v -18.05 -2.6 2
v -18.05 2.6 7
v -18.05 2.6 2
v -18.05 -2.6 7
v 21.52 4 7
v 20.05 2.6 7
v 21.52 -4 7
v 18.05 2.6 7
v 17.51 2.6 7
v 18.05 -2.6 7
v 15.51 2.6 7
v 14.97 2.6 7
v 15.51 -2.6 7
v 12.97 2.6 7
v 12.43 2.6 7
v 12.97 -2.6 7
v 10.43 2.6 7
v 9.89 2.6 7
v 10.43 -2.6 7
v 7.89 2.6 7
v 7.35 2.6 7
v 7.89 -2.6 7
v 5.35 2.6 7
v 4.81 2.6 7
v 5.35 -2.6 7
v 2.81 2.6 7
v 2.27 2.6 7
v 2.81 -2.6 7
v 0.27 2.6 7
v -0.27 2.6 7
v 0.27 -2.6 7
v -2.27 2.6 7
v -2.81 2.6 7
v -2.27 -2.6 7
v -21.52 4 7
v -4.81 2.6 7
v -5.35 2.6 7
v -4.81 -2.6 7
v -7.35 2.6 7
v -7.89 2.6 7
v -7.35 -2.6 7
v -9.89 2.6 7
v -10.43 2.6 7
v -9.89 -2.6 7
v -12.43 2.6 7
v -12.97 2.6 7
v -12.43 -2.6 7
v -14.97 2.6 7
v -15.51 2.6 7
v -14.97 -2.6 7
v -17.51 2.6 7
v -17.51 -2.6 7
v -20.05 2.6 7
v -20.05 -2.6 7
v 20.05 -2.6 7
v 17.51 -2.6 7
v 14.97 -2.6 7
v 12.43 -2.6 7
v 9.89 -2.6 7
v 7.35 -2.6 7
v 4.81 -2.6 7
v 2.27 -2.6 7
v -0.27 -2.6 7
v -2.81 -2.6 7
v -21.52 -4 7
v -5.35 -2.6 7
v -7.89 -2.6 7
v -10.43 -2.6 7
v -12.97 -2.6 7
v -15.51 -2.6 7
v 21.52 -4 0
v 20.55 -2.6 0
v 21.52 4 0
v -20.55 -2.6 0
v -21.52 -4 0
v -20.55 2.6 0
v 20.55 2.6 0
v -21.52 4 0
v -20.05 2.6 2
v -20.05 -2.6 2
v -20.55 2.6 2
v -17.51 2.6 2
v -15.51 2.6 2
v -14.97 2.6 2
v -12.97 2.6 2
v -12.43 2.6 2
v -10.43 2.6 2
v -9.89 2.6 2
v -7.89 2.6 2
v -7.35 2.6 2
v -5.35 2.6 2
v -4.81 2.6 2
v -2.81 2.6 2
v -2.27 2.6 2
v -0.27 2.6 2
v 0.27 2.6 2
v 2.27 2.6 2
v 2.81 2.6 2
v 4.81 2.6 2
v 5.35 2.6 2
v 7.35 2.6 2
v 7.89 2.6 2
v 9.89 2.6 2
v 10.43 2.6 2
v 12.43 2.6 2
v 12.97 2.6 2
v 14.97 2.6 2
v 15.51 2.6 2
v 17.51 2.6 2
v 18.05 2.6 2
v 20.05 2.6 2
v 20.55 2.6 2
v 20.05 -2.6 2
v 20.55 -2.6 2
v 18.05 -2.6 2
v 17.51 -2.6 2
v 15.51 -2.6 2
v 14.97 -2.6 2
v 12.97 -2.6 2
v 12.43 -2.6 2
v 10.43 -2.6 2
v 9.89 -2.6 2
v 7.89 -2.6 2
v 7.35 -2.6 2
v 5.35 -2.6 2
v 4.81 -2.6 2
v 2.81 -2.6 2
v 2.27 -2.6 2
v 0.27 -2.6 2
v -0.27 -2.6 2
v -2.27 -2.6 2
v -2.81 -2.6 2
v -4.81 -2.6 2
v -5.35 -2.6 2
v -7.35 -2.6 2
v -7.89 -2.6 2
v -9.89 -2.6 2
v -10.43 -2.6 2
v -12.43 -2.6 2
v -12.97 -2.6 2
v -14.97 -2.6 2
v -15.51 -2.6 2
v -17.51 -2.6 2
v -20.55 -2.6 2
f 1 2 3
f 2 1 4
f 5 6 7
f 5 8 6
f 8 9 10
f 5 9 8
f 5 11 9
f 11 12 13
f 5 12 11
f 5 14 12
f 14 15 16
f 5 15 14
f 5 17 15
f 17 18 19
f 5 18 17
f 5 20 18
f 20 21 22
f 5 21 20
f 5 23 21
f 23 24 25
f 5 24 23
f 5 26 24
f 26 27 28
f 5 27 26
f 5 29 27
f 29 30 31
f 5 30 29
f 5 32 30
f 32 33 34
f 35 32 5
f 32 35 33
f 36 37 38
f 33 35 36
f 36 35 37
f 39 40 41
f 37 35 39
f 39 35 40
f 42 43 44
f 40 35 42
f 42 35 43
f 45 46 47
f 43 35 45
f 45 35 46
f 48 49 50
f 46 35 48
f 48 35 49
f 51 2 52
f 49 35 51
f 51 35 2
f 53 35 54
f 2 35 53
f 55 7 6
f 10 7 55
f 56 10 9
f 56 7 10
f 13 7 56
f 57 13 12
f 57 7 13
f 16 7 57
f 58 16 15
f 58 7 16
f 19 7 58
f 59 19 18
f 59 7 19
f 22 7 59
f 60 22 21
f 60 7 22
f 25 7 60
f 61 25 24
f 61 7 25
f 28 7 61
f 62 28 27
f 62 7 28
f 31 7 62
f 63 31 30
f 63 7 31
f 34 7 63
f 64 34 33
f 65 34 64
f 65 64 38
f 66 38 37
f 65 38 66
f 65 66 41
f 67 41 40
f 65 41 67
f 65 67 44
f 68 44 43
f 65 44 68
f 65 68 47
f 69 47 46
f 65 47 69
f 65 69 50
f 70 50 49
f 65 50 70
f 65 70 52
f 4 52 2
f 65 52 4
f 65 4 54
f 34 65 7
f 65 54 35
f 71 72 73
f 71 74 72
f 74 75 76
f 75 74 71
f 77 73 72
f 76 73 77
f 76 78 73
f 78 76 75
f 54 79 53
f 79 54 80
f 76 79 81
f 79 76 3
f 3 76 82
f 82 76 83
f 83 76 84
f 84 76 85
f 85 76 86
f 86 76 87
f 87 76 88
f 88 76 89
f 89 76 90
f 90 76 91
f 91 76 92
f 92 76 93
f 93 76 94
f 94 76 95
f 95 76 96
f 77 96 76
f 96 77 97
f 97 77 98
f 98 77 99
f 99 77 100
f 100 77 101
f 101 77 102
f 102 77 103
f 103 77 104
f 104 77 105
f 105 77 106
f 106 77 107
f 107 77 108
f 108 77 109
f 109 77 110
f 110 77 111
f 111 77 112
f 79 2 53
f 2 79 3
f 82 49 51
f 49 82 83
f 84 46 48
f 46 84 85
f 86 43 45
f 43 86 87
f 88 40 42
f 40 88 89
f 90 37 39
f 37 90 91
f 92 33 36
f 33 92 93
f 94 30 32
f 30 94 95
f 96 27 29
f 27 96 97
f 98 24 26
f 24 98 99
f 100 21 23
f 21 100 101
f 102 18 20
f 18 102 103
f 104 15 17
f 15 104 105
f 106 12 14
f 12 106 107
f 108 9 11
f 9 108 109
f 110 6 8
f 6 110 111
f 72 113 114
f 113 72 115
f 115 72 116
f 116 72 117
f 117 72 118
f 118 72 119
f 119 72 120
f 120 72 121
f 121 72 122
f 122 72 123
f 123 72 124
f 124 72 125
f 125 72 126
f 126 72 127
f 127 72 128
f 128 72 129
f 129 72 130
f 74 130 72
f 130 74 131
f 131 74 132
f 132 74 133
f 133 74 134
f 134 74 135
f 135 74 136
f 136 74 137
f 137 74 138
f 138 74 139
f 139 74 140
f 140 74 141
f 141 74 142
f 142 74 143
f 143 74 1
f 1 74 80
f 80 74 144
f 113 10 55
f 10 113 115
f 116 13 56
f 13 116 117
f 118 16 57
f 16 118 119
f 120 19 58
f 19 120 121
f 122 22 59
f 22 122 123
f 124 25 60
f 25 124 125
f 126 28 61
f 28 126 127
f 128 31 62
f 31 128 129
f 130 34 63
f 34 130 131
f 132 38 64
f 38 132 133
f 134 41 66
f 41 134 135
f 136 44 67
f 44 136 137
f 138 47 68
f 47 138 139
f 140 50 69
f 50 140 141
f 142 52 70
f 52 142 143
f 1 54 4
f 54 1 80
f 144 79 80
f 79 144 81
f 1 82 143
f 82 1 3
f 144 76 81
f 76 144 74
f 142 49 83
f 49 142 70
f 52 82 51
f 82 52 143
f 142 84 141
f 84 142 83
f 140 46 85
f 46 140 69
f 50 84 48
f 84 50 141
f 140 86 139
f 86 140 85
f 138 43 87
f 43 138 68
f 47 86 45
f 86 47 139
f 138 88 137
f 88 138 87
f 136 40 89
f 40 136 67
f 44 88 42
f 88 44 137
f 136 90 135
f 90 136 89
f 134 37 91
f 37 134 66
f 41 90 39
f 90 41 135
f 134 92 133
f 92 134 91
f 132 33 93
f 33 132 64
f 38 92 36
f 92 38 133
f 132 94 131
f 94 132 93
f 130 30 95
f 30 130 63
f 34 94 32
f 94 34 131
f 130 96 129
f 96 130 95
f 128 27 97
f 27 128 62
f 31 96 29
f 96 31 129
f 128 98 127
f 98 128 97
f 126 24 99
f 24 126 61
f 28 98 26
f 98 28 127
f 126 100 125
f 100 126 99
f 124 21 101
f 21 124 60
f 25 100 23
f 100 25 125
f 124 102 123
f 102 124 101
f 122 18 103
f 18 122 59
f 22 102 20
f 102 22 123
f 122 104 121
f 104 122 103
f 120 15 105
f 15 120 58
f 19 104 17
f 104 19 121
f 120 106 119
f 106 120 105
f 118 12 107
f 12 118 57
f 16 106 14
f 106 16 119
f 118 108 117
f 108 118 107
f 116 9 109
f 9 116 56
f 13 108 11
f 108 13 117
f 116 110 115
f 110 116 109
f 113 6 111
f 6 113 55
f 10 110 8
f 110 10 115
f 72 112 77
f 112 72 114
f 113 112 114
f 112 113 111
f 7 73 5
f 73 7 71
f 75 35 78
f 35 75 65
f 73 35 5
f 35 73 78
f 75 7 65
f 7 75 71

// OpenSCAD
LED_WIDTH = 2;
LED_LIP_WIDTH = 3; 
LED_LENGTH = 5.2;
LED_LIP_LENGTH = LED_LENGTH;
LED_HEIGHT = 7;
LED_LIP_HEIGHT = 2;

LEDS = 16;
LED_SPACING = 2.54;

WALL_THICKNESS = 1.2;
LENGTH = LEDS * LED_SPACING + 2 * WALL_THICKNESS;
WIDTH = 8;
HEIGHT = LED_HEIGHT;

module led() {
  union() {
    translate([-LED_WIDTH/2, -LED_LENGTH/2, 0])
    cube(size = [LED_WIDTH, LED_LENGTH, LED_HEIGHT]);
    translate([-LED_LIP_WIDTH/2, -LED_LIP_LENGTH/2, 0])
    cube(size = [LED_LIP_WIDTH, LED_LIP_LENGTH, LED_LIP_HEIGHT]);
  }
}

module bar_graph() {
  difference() {
    translate([-LENGTH/2, -WIDTH/2, 0])
    cube(size = [LENGTH, WIDTH, HEIGHT]);

    translate([-((LEDS-1) * LED_SPACING)/2, 0, 0])
    for(i = [0 : LEDS-1]) {
      translate([i * LED_SPACING, 0, 0])
      led();
    }
  }
}

bar_graph();
